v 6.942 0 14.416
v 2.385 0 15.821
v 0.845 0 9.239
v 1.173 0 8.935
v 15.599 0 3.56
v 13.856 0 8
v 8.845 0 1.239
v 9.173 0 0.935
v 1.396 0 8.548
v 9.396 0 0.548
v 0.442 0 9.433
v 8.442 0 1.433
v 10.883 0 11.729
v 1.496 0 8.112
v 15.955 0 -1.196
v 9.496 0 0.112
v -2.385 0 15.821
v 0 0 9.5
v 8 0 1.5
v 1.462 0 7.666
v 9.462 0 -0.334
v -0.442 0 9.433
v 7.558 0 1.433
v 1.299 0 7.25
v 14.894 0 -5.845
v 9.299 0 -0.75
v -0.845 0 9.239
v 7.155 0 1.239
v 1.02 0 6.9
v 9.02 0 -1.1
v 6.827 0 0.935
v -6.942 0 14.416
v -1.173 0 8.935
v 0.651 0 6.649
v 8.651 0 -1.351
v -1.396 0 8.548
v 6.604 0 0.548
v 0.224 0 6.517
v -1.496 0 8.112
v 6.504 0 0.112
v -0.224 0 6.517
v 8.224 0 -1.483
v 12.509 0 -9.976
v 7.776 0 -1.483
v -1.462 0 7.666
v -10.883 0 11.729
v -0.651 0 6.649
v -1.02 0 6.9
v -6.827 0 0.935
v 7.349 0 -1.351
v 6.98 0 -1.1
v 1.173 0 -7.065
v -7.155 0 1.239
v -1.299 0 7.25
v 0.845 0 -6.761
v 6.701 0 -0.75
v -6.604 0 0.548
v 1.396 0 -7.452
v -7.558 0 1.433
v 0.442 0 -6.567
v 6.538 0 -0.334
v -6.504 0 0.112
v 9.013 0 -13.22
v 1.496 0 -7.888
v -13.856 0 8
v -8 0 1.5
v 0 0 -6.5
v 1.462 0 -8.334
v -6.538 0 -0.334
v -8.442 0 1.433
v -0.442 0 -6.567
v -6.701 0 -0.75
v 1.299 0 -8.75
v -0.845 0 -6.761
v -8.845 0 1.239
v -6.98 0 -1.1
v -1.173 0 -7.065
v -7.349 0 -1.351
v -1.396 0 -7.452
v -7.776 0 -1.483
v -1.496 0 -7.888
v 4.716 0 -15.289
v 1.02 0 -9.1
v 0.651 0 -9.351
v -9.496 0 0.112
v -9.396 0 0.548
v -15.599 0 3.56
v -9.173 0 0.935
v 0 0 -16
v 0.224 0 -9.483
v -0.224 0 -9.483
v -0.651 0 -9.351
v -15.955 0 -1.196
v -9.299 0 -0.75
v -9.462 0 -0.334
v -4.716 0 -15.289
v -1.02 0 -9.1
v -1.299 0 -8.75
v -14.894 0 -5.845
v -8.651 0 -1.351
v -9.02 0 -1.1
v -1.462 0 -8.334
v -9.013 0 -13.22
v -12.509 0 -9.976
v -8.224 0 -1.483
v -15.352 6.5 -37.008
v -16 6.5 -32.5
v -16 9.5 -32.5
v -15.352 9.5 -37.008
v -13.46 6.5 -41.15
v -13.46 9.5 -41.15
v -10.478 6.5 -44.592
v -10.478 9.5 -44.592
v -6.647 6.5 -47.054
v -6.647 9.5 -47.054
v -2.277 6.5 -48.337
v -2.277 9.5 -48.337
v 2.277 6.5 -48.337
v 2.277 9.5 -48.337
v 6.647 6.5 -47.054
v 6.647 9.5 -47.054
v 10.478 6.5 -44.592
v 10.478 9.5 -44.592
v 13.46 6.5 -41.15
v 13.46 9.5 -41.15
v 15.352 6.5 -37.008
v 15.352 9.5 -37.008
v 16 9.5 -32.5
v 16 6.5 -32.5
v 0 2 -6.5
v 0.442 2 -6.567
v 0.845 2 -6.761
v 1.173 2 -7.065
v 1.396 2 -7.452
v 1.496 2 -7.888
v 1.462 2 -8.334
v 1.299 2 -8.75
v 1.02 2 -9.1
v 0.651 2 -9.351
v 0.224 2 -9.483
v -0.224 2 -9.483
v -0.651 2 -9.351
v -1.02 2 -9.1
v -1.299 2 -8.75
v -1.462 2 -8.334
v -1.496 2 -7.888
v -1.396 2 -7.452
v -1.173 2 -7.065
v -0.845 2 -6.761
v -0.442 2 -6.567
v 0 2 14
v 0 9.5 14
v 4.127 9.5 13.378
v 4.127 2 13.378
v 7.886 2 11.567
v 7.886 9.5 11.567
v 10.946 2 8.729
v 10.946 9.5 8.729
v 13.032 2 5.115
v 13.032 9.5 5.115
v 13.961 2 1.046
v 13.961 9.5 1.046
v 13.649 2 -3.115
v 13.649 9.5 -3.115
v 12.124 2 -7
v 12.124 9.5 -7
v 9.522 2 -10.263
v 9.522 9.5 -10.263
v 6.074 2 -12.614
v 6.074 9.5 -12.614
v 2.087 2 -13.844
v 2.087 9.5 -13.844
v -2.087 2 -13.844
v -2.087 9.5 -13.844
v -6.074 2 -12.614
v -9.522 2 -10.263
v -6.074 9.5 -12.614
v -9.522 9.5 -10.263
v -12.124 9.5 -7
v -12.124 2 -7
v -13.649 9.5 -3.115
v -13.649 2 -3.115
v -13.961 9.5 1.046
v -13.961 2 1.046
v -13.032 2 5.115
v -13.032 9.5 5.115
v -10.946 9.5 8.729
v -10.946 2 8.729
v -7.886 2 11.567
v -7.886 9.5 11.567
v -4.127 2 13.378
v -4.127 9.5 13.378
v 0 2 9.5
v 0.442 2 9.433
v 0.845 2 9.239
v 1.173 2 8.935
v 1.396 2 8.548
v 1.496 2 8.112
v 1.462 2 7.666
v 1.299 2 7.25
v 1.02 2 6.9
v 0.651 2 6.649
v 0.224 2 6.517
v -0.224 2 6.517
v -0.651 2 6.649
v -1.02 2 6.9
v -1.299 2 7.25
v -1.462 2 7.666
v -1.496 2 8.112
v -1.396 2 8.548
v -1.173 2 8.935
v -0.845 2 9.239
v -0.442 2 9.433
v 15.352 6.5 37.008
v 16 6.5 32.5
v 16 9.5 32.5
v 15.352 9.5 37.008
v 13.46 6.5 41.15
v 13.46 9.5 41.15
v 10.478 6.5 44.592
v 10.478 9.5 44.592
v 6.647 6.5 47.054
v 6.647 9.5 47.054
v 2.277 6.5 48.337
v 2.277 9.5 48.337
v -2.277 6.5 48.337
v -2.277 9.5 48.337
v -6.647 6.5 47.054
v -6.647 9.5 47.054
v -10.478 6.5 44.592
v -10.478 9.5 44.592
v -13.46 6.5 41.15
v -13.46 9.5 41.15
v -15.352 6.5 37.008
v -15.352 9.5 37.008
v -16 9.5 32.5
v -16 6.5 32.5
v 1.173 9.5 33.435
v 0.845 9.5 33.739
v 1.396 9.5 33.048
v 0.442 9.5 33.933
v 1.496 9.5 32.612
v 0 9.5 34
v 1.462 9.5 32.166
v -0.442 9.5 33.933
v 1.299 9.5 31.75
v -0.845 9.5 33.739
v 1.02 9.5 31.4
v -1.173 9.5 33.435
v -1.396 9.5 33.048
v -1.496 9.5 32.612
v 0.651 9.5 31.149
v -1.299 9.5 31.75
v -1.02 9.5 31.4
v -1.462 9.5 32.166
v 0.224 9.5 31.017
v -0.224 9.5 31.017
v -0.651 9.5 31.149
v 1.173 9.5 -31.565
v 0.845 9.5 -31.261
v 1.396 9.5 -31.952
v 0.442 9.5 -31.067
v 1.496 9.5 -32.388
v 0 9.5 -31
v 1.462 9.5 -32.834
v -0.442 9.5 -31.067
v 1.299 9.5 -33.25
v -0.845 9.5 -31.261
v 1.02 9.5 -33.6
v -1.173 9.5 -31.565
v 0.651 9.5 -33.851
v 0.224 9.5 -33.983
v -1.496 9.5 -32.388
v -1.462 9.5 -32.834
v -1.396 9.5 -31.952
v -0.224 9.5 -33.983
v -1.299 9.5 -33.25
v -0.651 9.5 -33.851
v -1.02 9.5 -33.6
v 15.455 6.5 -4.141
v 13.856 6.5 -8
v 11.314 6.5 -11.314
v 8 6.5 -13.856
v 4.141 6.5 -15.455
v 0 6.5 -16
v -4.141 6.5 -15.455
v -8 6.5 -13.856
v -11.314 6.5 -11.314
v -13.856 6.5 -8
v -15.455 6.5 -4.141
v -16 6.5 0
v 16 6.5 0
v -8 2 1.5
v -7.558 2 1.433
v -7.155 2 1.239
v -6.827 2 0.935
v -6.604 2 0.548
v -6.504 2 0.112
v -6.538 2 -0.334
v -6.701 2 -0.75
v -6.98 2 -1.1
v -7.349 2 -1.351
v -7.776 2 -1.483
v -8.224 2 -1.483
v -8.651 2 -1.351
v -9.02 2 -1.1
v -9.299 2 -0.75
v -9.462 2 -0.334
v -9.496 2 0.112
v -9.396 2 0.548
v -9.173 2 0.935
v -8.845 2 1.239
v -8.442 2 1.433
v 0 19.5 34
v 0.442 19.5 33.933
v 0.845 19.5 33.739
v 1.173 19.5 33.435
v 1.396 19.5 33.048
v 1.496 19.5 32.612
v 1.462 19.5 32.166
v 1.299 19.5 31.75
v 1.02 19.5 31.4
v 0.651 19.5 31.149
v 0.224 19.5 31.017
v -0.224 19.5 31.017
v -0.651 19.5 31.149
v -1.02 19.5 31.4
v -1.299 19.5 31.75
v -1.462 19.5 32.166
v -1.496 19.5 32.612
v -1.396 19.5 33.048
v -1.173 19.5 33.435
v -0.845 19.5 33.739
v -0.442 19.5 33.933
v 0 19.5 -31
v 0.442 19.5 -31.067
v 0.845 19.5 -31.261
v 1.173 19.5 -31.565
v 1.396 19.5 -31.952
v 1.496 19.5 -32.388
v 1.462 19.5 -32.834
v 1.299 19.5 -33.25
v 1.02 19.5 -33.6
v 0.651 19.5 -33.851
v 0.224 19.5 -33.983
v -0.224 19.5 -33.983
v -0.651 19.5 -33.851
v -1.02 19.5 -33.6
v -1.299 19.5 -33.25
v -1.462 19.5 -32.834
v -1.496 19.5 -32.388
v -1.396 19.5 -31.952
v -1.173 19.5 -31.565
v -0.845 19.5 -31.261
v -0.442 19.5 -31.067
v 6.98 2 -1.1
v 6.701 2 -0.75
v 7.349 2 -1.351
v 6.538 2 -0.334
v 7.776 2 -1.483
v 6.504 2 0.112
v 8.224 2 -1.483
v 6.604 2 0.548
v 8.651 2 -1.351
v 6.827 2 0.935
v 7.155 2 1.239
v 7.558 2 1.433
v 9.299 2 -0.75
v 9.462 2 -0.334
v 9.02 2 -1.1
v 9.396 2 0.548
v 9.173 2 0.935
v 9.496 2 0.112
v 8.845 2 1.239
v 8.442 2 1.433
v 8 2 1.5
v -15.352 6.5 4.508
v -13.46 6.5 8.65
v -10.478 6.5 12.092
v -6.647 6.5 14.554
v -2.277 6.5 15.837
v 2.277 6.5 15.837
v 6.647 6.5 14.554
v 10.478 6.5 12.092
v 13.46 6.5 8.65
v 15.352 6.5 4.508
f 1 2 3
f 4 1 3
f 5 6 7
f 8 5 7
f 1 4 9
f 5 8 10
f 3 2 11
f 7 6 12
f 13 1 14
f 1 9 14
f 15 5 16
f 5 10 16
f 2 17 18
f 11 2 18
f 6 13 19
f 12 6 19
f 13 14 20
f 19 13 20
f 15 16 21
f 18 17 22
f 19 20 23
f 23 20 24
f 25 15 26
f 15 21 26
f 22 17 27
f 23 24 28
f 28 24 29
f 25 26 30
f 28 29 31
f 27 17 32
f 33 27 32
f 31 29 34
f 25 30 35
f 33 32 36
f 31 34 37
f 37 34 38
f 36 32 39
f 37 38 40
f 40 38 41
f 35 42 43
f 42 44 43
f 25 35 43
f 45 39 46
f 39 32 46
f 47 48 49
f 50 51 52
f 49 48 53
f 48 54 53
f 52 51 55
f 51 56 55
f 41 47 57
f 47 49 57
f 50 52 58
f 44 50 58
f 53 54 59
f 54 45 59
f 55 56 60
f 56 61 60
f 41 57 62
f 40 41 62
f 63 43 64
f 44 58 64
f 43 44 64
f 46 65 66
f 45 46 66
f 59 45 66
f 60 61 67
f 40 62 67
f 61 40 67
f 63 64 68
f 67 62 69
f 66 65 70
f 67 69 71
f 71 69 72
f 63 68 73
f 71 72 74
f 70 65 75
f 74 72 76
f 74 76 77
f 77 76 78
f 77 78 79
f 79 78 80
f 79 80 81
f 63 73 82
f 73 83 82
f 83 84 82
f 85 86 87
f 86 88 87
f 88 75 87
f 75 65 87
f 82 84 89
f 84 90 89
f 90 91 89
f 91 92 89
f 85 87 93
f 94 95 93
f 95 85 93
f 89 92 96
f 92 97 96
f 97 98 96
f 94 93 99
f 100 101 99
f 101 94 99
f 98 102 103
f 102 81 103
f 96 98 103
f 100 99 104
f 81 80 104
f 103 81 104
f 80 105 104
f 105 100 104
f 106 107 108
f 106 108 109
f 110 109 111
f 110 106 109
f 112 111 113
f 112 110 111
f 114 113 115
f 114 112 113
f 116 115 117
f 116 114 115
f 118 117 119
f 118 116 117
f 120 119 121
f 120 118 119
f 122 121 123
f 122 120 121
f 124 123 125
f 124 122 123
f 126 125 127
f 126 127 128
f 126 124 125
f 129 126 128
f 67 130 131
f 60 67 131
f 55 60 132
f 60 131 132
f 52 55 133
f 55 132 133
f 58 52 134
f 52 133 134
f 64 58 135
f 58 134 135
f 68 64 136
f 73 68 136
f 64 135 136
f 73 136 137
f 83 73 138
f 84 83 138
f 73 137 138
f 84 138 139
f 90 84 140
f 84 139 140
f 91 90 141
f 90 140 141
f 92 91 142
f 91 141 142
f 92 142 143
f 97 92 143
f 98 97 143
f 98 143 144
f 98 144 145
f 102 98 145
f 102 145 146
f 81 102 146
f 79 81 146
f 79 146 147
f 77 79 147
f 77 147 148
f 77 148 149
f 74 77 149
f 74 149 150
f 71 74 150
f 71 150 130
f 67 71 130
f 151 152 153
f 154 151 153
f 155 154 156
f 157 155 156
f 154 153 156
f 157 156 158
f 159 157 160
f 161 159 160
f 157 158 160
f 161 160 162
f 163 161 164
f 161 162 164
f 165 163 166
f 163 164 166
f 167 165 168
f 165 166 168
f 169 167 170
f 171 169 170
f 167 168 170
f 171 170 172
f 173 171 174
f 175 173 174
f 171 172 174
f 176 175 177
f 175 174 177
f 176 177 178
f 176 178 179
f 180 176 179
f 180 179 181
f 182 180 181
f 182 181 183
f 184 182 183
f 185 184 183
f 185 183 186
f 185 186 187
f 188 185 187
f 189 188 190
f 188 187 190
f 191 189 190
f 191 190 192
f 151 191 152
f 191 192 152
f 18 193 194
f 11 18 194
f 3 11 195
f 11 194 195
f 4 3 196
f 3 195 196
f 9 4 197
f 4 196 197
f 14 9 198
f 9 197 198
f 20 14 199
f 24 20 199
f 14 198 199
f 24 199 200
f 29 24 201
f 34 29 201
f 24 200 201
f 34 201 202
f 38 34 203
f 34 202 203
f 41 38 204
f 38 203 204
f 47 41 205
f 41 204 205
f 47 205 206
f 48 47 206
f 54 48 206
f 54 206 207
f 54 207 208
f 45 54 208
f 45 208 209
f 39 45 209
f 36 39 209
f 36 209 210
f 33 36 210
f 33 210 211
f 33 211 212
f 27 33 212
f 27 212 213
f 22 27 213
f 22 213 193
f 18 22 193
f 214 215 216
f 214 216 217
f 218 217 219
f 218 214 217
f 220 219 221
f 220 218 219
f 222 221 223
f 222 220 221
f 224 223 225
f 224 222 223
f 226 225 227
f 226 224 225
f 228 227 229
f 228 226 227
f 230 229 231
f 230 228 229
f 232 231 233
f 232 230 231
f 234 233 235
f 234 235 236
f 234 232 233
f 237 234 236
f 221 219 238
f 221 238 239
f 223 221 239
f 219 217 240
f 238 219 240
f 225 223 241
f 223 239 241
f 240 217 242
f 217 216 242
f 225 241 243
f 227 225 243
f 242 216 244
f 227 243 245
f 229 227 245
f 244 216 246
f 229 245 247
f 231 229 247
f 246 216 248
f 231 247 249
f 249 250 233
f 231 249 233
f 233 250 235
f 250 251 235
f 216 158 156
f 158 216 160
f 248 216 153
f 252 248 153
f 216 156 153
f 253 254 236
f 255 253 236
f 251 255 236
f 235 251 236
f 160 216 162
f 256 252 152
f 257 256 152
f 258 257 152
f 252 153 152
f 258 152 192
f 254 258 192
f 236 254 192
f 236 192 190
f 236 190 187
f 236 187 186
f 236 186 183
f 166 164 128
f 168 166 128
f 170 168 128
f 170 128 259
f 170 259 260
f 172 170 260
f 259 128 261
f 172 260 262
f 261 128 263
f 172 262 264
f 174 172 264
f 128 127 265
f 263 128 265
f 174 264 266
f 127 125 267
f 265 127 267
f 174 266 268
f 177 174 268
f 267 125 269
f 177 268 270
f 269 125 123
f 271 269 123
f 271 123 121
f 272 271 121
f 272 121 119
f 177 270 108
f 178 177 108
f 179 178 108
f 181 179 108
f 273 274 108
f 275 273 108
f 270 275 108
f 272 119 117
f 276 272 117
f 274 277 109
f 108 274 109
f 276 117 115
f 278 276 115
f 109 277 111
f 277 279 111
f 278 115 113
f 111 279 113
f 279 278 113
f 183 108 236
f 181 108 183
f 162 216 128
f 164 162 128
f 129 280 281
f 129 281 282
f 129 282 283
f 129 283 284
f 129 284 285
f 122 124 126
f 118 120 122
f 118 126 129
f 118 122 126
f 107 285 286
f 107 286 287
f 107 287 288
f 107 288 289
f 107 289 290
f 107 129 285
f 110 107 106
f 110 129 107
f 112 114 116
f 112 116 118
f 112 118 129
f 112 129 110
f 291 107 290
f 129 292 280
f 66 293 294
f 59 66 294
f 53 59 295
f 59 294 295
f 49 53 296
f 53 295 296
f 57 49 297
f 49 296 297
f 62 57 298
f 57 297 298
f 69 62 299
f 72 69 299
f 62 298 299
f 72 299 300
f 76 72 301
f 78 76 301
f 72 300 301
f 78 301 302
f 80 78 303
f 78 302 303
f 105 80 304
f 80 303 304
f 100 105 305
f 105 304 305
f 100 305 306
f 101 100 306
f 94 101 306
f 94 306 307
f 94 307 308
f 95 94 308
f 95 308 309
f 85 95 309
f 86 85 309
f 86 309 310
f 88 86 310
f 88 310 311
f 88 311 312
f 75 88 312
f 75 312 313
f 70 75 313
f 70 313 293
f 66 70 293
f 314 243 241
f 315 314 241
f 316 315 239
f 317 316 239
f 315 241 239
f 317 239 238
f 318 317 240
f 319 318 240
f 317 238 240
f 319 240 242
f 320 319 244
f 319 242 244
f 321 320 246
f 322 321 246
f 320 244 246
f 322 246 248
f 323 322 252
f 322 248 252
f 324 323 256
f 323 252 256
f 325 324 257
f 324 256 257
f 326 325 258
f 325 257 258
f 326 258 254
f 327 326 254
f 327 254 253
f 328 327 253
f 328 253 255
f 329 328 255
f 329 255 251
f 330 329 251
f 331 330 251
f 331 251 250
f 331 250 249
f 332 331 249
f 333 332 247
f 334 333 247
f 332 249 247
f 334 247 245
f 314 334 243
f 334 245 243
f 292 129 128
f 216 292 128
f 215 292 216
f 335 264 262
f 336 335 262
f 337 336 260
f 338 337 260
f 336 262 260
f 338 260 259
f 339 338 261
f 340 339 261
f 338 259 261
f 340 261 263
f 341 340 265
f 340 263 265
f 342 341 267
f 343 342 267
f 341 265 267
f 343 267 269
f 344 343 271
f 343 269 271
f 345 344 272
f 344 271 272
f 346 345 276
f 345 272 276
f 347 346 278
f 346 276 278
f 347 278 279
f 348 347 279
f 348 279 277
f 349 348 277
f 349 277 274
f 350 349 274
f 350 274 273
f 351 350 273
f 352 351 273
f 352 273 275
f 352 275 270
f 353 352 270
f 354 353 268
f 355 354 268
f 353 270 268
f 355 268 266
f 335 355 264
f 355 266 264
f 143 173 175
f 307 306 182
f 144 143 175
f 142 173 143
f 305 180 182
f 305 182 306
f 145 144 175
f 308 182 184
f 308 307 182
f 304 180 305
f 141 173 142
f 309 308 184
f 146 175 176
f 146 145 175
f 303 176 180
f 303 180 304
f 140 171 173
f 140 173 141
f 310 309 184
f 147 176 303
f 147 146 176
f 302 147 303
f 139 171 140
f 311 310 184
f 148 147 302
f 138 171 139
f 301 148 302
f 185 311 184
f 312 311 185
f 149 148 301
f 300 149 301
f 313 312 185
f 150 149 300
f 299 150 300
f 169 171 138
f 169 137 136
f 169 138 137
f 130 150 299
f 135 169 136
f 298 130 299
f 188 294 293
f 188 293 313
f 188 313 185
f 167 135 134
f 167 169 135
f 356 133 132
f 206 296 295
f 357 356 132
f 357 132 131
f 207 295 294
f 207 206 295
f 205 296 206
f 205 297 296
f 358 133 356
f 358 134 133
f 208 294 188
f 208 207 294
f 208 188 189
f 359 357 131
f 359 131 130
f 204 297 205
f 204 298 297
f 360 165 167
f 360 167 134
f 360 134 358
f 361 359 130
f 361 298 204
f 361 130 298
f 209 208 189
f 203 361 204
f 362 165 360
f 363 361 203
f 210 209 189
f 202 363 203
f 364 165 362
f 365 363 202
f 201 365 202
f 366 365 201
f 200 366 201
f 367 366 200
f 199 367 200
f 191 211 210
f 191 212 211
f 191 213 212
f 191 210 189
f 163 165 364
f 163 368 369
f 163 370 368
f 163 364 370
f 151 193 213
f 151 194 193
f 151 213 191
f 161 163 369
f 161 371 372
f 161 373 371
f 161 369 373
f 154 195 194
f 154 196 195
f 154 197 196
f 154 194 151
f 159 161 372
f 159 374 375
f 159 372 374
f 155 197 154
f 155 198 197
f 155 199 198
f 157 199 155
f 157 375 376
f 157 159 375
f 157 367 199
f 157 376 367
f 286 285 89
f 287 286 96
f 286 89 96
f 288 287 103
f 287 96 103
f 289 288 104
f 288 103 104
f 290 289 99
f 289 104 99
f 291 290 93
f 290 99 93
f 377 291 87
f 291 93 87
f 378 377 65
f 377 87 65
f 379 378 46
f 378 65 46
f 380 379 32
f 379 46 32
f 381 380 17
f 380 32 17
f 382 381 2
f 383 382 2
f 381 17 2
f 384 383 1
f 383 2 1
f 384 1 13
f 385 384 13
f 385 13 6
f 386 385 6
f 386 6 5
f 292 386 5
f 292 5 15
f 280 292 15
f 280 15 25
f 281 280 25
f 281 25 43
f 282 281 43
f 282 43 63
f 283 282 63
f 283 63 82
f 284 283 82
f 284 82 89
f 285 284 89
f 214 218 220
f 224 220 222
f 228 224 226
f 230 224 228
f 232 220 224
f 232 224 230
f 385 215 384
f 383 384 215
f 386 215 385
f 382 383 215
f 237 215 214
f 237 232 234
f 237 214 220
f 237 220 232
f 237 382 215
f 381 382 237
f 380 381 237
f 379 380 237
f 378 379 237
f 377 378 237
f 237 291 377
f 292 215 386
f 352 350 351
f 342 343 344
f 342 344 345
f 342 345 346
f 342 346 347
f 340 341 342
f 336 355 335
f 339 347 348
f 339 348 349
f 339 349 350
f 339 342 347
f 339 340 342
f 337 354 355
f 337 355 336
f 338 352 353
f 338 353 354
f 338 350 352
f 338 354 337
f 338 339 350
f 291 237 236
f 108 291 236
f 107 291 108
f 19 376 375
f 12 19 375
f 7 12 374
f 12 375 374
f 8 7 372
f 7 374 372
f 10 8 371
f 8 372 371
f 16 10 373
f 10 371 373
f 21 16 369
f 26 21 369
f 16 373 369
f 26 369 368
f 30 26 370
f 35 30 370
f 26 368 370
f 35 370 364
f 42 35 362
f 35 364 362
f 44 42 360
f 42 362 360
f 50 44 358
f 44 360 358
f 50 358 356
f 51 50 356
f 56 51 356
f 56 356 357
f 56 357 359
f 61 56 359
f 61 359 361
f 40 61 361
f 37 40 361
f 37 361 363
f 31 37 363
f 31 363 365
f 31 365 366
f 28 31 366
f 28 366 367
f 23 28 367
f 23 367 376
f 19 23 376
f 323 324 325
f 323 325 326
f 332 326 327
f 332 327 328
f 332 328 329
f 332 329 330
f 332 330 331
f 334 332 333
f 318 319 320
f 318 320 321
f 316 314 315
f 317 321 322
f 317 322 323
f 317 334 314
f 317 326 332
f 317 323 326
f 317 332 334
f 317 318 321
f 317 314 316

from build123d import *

# Parameters (mm, degrees)
SKETCH1_R           = 16
BOSS_EXTRUDE1_DEPTH = 6.5
BOSS_EXTRUDE2_DEPTH = 3
SKETCH3_R           = 1.5
BOSS_EXTRUDE3_DEPTH = 10
SKETCH4_R           = 14
CUT_EXTRUDE1_DEPTH  = 7.5
SKETCH5_R           = 1.5
CUT_EXTRUDE2_DEPTH  = 54.986109325


with BuildPart() as part:
    # Sketch1 → Boss-Extrude1 (new body)
    with BuildSketch(Plane(origin=(0, 0, 0), x_dir=(1, 0, 0), z_dir=(0, 1, 0))):
        with Locations(Location((0, 0, 0), (0, 0, 90))):
            Circle(SKETCH1_R)
    extrude(amount=BOSS_EXTRUDE1_DEPTH)

    # Sketch2 → Boss-Extrude2 (add)
    with BuildSketch(Plane(origin=(0, 6.5, 0), x_dir=(1, 0, 0), z_dir=(0, 1, 0))):
        with BuildLine():
            Line((-16, -32.5), (-16, 32.5))
            ThreePointArc((-16, 32.5), (0, 48.5), (16, 32.5))
            Line((16, 32.5), (16, -32.5))
            ThreePointArc((16, -32.5), (0, -48.5), (-16, -32.5))
        make_face()
    extrude(amount=BOSS_EXTRUDE2_DEPTH)

    # Sketch3 → Boss-Extrude3 (add)
    with BuildSketch(Plane(origin=(0, 9.5, 0), x_dir=(1, 0, 0), z_dir=(0, 1, 0))):
        with Locations(Location((0, 32.5, 0), (0, 0, 270))):
            Circle(SKETCH3_R)
        with Locations(Location((0, -32.5, 0), (0, 0, 270))):
            Circle(SKETCH3_R)
    extrude(amount=BOSS_EXTRUDE3_DEPTH)

    # Sketch4 → Cut-Extrude1 (cut)
    with BuildSketch(Plane(origin=(0, 9.5, 0), x_dir=(1, 0, 0), z_dir=(0, 1, 0))):
        with Locations(Location((0, 0, 0), (0, 0, 270))):
            Circle(SKETCH4_R)
    extrude(amount=-CUT_EXTRUDE1_DEPTH, mode=Mode.SUBTRACT)

    # Sketch5 → Cut-Extrude2 (cut, through all)
    with BuildSketch(Plane(origin=(0, 2, 0), x_dir=(1, 0, 0), z_dir=(0, 1, 0))):
        with Locations(Location((8, 0, 0), (0, 0, 270))):
            Circle(SKETCH5_R)
        with Locations(Location((0, -8, 0), (0, 0, 270))):
            Circle(SKETCH5_R)
        with Locations(Location((-8, 0, 0), (0, 0, 270))):
            Circle(SKETCH5_R)
        with Locations(Location((0, 8, 0), (0, 0, 270))):
            Circle(SKETCH5_R)
    extrude(amount=-CUT_EXTRUDE2_DEPTH, mode=Mode.SUBTRACT)


solid = part.part
